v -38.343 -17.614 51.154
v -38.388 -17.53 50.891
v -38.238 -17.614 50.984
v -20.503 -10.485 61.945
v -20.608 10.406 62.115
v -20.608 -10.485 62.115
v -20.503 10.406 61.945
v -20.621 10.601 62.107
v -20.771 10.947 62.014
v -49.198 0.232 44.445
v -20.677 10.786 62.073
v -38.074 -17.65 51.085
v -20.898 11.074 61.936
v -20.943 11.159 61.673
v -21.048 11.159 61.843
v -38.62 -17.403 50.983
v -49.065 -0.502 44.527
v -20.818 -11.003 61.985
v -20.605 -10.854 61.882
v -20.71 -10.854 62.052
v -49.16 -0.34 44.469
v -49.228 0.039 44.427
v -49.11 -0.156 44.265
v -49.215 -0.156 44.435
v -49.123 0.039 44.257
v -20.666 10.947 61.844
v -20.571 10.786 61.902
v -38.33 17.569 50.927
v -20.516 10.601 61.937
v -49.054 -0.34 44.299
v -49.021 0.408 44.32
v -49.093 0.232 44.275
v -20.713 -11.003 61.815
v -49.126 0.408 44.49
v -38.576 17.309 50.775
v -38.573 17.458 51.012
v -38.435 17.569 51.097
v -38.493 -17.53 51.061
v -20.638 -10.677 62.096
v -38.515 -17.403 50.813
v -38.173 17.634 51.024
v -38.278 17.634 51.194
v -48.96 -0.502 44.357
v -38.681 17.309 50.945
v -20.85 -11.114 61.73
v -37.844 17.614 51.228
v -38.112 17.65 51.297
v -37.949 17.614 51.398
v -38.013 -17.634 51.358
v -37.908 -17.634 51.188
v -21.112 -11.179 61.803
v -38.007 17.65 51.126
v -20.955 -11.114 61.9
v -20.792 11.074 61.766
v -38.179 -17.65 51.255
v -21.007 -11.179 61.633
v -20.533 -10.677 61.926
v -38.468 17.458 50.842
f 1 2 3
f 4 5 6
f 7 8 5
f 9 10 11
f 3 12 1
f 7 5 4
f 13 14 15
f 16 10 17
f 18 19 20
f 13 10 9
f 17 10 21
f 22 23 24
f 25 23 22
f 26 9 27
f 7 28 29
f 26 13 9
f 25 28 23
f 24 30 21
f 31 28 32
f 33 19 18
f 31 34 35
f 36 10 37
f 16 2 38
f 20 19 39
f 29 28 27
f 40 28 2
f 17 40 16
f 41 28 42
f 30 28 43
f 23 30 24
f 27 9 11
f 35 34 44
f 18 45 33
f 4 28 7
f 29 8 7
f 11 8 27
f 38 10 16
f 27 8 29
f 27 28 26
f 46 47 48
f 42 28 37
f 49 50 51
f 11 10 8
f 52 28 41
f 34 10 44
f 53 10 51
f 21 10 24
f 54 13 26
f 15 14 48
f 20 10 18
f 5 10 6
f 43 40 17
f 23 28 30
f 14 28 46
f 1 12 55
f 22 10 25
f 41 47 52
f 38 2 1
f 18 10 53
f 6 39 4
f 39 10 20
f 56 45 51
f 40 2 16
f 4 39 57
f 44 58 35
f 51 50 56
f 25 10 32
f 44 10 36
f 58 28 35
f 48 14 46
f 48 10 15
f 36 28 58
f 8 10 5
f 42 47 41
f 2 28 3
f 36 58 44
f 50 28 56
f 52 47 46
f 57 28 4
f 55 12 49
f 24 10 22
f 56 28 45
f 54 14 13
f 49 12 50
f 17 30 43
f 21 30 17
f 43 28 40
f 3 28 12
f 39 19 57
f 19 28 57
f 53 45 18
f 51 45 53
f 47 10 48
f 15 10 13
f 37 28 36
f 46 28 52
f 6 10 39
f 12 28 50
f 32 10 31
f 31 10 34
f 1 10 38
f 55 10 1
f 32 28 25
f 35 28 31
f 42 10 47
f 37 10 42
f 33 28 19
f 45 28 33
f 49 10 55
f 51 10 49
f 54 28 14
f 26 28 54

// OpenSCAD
// file: def.scad
inf = 1000;

round_radius = 1;
sticker_margin = 2.5;
sticker_round_radius = 0.75;

phi = (sqrt(5) + 1) / 2;
outer_radius = 80;
edge_length = outer_radius / sqrt(phi * phi * phi * phi + 1) * 2;
inner_radius = sqrt(outer_radius * outer_radius - (edge_length / 2 / cos(54)) * (edge_length / 2 / cos(54)));
cut1_length = edge_length / (1 / (phi * phi) + 2) * 3;
center_cut_length = edge_length * (sin(54) + 1);
cut1_dis = inner_radius * (center_cut_length - cut1_length) / (center_cut_length - edge_length);

theta = atan(edge_length / 2 * tan(54) / inner_radius);

face_inner_radius = edge_length / 2 * tan(54);
face_center_length = edge_length * tan(54) / cos(18);
sticker_cut1_dis = face_inner_radius * (face_center_length - cut1_length) / (face_center_length - edge_length);
sticker_dif_cut1_dis = sticker_cut1_dis - round_radius * tan(theta) + round_radius - sticker_margin;
sticker_int_cut1_dis = sticker_cut1_dis + round_radius / tan(theta) - round_radius + sticker_margin;
sticker_dif_cut2_dis = face_inner_radius - round_radius * tan(theta) + round_radius - sticker_margin;

module _int_cut1() {
    translate([-inf, -inf, cut1_dis + round_radius])
        cube([inf * 2, inf * 2, inf]);
}

module _dif_cut1() {
    translate([-inf, -inf, cut1_dis - round_radius])
        cube([inf * 2, inf * 2, inf]);
}

module _sticker_int_cut1() {
    rotate([-90, 0, 0])
        translate([-inf, -inf, sticker_int_cut1_dis])
            cube([inf * 2, inf * 2, inf]);
}

module _sticker_dif_cut1() {
    rotate([-90, 0, 0])
        translate([-inf, -inf, sticker_dif_cut1_dis])
            cube([inf * 2, inf * 2, inf]);
}

module _sticker_dif_cut2() {
    rotate([-90, 0, 0])
        translate([-inf, -inf, sticker_dif_cut2_dis])
            cube([inf * 2, inf * 2, inf]);
}

module _base() {
    intersection_for(vec = [[0, 0, 0], [90, 90, 0], [90, 0, 90]])
        intersection_for(ang = [theta, -theta, 180 + theta, 180 - theta])
            rotate(vec)
                rotate([0, ang, 0])
                    translate([-inf, -inf, -inner_radius + round_radius])
                        cube([inf * 2, inf * 2, inf]);
}

module _sticker_base() {
    difference() {
        cube([inf, inf, 0.1], center = true);
        for (ang = [0 : 72 : 288])
            rotate([0, 0, ang])
                _sticker_dif_cut2();
    }
}

module _selector_base(dis) {
    intersection_for(vec = [[0, 0, 0], [90, 90, 0], [90, 0, 90]])
        intersection_for(ang = [theta, -theta, 180 + theta, 180 - theta])
            rotate(vec)
                rotate([0, ang, 0])
                    translate([-inf, -inf, -dis])
                        cube([inf * 2, inf * 2, inf]);
}
// main file
include <def.scad>

module center_sticker() {
    minkowski() {
        difference() {
            _sticker_base();
            for (ang = [0 : 72 : 288])
                rotate([0, 0, ang])
                    _sticker_dif_cut1();
        }
        cylinder(r = sticker_round_radius, h = 0.1, center = true, $fn = 24);
    }
}

rotate([0, -theta, 0])
    translate([0, 0, inner_radius])
        rotate([0, 0, -18])
            center_sticker();
